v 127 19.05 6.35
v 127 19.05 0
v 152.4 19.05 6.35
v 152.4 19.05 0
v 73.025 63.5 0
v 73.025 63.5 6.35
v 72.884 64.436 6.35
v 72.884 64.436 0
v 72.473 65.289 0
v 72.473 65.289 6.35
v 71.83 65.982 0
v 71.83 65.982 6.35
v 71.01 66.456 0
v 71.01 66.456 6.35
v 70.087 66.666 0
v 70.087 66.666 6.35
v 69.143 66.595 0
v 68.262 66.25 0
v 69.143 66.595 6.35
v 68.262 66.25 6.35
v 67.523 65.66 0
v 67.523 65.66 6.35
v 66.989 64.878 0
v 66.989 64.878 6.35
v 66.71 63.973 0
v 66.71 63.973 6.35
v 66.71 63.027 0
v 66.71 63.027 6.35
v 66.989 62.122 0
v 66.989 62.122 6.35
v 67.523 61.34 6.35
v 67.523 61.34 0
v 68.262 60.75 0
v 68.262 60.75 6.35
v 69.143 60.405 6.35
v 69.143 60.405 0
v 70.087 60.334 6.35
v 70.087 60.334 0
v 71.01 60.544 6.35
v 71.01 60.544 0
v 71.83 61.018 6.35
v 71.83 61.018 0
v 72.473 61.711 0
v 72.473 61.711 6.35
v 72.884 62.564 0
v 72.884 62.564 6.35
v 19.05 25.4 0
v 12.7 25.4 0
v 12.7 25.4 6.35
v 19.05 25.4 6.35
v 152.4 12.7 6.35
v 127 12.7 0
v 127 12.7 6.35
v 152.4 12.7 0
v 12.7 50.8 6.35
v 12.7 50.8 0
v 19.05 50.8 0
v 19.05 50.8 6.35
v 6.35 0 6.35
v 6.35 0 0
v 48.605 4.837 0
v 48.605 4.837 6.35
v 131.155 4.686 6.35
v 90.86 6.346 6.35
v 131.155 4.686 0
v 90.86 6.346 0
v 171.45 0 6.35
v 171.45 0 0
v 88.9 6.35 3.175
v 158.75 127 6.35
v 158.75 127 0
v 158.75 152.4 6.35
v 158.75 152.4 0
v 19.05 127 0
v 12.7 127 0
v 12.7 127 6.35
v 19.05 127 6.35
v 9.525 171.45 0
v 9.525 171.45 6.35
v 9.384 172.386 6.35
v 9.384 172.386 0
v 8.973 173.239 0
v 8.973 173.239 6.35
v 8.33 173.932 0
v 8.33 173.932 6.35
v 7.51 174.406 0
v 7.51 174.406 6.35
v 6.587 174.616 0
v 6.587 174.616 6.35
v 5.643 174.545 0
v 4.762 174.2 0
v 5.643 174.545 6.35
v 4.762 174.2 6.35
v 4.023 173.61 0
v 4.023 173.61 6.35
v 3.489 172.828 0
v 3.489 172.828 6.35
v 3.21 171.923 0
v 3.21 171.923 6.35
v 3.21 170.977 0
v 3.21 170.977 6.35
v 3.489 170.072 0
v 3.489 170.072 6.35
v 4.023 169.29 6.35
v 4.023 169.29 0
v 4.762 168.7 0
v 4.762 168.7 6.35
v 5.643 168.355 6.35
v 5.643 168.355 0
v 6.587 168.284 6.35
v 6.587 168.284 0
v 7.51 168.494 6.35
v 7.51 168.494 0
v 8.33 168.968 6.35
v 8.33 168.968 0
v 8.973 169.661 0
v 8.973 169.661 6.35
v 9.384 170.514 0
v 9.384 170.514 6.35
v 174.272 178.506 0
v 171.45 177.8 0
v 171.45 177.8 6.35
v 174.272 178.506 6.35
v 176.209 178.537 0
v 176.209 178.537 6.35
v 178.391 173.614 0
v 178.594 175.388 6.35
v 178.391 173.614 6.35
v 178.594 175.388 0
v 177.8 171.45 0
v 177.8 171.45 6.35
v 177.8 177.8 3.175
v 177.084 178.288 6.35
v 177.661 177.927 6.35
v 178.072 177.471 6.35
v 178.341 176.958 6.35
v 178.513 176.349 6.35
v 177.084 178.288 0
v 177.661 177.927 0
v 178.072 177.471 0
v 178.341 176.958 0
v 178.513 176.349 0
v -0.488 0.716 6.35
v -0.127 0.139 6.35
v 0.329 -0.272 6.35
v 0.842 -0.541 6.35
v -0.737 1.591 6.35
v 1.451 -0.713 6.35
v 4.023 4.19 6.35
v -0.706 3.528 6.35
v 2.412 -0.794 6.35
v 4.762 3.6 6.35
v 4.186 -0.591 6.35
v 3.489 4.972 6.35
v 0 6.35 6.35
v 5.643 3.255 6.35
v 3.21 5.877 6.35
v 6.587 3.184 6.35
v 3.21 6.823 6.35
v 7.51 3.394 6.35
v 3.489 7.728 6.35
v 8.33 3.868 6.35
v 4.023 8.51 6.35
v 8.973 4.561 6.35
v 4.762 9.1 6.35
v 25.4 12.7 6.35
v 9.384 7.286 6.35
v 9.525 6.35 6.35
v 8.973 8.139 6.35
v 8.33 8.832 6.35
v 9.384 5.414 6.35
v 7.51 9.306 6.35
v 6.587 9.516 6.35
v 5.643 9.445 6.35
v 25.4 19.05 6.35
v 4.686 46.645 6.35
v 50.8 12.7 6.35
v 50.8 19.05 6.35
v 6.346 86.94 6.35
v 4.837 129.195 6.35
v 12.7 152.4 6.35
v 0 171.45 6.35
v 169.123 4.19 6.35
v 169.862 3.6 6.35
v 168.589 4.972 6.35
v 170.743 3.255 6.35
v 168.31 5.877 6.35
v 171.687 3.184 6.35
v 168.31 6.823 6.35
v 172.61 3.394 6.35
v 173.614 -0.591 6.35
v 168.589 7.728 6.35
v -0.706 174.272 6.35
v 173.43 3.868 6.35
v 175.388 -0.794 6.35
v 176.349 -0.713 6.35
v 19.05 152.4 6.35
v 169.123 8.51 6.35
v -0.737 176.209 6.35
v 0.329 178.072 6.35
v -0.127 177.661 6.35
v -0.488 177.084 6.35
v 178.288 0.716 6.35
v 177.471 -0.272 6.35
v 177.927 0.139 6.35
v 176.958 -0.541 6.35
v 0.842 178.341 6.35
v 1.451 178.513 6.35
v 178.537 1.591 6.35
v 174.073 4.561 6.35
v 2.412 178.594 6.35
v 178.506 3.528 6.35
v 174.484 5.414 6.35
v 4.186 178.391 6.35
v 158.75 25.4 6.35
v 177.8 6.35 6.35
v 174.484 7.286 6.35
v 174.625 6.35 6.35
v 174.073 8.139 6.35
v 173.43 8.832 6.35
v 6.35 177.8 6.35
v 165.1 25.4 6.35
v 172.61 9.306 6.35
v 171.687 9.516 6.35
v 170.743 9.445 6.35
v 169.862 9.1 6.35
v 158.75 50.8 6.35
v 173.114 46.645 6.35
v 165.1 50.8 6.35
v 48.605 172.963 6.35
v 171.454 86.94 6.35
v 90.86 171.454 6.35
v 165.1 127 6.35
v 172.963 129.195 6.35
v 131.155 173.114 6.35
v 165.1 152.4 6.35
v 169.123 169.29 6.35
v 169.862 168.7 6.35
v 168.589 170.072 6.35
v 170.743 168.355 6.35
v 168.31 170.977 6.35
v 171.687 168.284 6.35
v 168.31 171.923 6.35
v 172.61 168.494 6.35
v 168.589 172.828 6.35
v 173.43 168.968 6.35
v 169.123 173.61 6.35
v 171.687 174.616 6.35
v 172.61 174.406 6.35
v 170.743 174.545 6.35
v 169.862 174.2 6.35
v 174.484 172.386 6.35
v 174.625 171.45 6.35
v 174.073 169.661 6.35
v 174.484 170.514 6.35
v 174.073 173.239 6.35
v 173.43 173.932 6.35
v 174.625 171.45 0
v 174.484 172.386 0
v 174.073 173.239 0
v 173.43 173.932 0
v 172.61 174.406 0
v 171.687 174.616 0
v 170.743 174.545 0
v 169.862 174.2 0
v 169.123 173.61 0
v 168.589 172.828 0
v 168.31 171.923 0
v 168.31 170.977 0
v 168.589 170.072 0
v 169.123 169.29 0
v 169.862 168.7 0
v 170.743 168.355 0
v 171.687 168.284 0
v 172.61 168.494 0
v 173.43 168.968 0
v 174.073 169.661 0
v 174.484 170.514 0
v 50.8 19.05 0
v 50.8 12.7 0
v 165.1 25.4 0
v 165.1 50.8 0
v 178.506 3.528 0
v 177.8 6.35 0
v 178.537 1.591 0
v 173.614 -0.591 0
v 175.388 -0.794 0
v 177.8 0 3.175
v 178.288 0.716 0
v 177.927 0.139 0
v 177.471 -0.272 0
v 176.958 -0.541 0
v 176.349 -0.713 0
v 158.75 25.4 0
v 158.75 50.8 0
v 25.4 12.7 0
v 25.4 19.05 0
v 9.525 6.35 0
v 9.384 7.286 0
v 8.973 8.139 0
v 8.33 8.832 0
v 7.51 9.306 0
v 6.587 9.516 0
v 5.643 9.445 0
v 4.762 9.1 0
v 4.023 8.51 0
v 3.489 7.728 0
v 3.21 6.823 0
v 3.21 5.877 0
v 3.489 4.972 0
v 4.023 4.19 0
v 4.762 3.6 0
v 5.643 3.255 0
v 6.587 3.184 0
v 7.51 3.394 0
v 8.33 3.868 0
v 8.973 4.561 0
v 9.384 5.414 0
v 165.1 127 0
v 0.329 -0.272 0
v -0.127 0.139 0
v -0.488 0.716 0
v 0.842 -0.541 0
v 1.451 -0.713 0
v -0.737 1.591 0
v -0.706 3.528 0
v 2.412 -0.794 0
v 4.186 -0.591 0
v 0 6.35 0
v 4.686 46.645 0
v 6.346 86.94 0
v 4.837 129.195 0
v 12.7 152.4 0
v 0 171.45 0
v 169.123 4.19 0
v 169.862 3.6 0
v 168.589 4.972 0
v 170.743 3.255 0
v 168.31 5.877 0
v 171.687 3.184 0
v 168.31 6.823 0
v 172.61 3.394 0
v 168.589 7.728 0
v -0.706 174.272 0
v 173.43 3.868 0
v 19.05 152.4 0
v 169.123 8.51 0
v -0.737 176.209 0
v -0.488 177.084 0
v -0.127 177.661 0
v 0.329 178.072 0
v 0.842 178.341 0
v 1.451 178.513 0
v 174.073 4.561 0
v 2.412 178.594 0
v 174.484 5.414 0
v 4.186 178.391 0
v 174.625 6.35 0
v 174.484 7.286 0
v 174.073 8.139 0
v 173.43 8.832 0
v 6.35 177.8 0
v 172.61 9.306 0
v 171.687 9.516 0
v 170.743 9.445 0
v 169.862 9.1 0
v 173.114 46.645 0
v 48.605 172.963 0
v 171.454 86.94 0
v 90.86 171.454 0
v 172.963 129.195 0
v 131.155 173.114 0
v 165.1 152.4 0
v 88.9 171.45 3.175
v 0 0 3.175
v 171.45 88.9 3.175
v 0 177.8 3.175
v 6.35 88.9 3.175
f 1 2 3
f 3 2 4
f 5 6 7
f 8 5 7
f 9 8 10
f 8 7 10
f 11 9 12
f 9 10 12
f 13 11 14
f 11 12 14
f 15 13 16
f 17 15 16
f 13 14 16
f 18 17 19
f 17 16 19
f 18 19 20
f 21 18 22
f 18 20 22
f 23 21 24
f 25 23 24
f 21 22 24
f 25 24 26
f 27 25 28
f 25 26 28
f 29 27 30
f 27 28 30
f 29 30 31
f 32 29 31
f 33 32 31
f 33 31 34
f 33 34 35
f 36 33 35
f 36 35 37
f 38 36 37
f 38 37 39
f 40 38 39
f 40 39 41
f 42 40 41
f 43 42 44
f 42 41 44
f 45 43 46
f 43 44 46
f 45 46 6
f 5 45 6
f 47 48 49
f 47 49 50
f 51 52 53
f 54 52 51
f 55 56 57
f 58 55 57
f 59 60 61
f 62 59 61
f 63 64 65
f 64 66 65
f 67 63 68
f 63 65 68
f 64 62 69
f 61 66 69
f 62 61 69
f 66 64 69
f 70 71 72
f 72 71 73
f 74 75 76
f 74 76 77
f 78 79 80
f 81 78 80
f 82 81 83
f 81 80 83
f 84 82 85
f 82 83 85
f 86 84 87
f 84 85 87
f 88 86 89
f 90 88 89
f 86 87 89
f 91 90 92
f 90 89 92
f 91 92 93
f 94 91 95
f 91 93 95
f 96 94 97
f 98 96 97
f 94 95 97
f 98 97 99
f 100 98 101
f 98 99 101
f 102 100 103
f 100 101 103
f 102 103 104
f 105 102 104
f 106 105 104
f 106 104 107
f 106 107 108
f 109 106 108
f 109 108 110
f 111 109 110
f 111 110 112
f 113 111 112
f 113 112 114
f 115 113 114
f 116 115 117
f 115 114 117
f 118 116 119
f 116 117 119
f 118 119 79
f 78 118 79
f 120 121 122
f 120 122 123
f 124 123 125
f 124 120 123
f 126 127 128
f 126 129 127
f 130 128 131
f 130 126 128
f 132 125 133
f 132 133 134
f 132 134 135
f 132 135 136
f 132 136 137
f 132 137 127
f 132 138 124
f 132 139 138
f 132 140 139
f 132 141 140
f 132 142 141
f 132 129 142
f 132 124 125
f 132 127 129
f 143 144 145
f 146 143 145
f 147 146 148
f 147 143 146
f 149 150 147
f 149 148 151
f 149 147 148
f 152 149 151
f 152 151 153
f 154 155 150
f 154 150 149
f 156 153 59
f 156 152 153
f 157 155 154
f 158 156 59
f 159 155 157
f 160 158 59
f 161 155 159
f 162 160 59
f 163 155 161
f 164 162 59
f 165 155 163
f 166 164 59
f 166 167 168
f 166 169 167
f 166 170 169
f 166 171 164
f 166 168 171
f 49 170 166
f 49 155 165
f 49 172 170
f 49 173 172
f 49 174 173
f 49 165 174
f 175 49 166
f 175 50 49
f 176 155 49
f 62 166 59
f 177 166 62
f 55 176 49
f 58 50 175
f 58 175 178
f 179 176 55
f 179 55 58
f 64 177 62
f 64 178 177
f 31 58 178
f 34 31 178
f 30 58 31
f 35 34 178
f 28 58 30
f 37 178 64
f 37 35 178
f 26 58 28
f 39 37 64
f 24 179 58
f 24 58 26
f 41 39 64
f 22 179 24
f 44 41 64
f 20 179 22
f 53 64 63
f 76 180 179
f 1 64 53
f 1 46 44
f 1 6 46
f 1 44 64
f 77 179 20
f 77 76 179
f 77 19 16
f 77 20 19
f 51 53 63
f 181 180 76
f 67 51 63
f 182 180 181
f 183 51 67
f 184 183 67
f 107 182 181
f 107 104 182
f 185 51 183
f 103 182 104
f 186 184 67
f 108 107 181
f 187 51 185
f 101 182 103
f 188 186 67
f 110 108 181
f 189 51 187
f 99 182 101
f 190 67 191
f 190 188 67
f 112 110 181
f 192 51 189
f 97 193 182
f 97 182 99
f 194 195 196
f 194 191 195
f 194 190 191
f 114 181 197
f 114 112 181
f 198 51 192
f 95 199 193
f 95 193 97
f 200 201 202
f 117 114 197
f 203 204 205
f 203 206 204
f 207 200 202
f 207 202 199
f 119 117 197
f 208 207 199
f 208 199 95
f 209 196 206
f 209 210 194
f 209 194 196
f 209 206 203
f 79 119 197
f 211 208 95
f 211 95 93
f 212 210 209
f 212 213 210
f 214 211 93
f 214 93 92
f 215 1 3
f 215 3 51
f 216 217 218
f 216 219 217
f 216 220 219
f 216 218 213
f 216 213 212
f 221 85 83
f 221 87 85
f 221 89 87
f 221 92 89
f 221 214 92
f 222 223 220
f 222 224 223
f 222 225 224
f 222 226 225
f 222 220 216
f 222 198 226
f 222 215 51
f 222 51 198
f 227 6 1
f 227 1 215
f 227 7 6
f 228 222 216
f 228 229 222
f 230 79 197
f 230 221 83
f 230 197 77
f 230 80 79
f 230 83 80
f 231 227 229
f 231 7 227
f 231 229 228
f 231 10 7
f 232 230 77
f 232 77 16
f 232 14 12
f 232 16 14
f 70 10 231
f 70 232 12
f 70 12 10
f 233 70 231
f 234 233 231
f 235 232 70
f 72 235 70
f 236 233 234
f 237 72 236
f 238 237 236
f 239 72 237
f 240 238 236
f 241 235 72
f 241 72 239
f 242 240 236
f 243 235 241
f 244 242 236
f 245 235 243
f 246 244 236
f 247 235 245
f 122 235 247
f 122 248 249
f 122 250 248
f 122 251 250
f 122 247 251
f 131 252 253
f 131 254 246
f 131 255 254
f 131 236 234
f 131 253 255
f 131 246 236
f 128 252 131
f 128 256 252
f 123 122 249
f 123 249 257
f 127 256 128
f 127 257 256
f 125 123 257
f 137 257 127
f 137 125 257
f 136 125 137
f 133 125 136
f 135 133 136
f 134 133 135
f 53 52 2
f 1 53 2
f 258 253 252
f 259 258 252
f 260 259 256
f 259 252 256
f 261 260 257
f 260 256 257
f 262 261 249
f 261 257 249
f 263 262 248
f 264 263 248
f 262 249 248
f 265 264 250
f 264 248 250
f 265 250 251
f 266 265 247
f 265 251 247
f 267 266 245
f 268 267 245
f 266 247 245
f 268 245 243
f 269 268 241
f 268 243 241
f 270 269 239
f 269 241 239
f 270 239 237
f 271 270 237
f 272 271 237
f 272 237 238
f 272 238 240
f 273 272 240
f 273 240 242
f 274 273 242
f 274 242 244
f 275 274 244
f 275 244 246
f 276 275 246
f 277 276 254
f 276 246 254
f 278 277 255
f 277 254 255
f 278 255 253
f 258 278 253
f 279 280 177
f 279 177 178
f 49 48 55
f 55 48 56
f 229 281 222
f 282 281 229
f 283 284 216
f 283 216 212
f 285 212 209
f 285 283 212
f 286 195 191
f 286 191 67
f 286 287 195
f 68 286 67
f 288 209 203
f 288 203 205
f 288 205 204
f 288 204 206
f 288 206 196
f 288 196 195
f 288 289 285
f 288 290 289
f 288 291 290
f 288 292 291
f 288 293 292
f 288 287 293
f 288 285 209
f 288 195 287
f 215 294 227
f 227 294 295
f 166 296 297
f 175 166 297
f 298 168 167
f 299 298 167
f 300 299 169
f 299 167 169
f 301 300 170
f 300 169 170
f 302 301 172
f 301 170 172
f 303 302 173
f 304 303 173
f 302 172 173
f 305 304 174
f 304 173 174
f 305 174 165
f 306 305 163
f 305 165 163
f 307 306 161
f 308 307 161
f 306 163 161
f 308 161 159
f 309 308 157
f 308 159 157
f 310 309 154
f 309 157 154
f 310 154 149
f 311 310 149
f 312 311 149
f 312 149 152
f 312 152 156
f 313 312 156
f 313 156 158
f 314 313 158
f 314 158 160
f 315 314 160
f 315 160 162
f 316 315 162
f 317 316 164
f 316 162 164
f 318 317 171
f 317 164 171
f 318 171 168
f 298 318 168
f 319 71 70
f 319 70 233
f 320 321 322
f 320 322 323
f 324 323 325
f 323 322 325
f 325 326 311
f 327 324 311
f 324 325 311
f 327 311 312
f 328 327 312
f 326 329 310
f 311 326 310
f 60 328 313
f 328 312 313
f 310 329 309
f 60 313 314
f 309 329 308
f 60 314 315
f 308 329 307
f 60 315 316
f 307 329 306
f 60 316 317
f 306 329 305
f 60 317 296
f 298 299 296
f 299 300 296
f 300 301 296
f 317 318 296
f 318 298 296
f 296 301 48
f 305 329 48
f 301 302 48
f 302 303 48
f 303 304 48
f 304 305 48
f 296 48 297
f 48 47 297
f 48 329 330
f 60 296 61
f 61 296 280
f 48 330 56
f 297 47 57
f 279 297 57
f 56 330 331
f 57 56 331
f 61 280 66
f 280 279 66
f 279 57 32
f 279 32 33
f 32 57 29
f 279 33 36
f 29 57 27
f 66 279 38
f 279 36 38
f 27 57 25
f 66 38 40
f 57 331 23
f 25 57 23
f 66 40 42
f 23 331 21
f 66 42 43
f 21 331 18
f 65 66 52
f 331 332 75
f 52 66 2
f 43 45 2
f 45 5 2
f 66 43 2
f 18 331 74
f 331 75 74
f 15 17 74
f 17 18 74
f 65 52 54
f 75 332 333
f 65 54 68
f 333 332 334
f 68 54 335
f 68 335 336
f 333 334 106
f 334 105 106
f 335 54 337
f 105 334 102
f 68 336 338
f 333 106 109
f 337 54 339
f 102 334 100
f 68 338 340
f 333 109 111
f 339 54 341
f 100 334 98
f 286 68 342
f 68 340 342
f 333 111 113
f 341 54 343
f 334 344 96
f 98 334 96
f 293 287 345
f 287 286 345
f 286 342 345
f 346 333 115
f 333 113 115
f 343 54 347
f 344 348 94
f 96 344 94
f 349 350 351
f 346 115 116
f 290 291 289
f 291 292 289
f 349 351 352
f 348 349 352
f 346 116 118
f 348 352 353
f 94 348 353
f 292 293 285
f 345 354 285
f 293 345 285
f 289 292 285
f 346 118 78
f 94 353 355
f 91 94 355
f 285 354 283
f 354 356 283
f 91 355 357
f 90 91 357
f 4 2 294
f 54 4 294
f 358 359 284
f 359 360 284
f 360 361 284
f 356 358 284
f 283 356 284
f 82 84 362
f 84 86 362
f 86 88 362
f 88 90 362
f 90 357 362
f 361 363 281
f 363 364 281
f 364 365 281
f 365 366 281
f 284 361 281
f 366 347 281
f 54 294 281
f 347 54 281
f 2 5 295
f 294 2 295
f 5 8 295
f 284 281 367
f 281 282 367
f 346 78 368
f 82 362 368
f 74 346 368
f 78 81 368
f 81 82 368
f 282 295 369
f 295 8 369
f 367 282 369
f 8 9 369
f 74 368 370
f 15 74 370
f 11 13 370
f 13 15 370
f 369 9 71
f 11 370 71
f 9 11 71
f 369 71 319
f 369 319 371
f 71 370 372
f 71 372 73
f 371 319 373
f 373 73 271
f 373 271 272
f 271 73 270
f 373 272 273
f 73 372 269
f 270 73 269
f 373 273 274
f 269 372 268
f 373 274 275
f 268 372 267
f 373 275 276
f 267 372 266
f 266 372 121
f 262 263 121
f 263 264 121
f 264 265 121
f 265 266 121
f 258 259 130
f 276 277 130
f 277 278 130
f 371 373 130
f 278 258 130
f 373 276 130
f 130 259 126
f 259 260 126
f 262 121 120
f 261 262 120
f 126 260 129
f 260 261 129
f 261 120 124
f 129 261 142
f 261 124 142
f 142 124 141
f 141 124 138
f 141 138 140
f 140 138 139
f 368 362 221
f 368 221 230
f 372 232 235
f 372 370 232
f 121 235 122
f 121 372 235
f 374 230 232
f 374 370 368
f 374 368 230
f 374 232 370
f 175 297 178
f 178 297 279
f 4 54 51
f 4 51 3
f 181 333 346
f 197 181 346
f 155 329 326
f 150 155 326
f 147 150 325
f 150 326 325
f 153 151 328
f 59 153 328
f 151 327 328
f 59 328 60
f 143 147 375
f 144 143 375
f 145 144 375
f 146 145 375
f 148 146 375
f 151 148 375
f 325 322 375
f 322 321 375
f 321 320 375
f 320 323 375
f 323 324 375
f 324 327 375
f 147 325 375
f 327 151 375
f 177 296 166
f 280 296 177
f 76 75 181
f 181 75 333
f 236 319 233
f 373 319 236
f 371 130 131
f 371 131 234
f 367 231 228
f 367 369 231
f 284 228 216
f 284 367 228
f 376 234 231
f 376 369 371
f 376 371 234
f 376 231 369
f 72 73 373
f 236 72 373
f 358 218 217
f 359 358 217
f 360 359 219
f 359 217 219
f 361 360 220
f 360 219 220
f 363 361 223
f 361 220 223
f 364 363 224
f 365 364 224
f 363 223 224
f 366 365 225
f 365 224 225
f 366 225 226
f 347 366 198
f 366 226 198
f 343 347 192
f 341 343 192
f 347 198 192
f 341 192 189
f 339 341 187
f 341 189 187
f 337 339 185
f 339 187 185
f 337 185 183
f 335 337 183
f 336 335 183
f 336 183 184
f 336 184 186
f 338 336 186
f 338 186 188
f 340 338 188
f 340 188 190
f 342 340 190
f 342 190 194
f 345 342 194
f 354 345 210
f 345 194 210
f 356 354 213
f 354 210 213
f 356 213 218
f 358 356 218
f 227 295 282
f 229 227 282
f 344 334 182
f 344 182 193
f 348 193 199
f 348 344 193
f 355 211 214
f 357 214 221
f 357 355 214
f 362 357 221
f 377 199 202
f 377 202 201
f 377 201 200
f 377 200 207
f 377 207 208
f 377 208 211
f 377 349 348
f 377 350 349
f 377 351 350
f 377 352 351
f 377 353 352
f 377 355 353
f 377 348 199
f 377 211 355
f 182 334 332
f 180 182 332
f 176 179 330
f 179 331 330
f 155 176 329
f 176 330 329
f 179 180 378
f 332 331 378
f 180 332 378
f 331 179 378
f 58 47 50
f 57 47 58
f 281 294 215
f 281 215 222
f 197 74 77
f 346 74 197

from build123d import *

# Parameters (mm, degrees)
SKETCH1_W           = 6.35
SKETCH1_H           = 25.4
SKETCH1_W_2         = 25.4
SKETCH1_H_2         = 6.35
BOSS_EXTRUDE1_DEPTH = 6.35
SKETCH2_R           = 3.175
CUT_EXTRUDE1_DEPTH  = 6.35
SKETCH3_R           = 3.175
CUT_EXTRUDE2_DEPTH  = 6.35


with BuildPart() as part:
    # Sketch1 → Boss-Extrude1 (new body)
    with BuildSketch(Plane.XY):
        with BuildLine():
            add(Edge.make_bspline(
                [(0, 171.45), (12.7, 88.9), (0, 6.35)],
                knots=[0, 0, 0, 1, 1, 1], degree=2))
            add(Edge.make_bspline(
                [(0, 6.35), (-3.175, -3.175), (6.35, 0)],
                knots=[0, 0, 0, 1, 1, 1], degree=2))
            add(Edge.make_bspline(
                [(6.35, 0), (88.9, 12.7), (171.45, 0)],
                knots=[0, 0, 0, 1, 1, 1], degree=2))
            add(Edge.make_bspline(
                [(177.8, 6.35), (180.975, -3.175), (171.45, 0)],
                knots=[0, 0, 0, 1, 1, 1], degree=2))
            add(Edge.make_bspline(
                [(177.8, 171.45), (165.1, 88.9), (177.8, 6.35)],
                knots=[0, 0, 0, 1, 1, 1], degree=2))
            add(Edge.make_bspline(
                [(171.45, 177.8), (180.975, 180.975), (177.8, 171.45)],
                knots=[0, 0, 0, 1, 1, 1], degree=2))
            add(Edge.make_bspline(
                [(6.35, 177.8), (88.9, 165.1), (171.45, 177.8)],
                knots=[0, 0, 0, 1, 1, 1], degree=2))
            add(Edge.make_bspline(
                [(0, 171.45), (-3.175, 180.975), (6.35, 177.8)],
                knots=[0, 0, 0, 1, 1, 1], degree=2))
        make_face()
        with Locations((15.875, 38.1)):
            Rectangle(SKETCH1_W, SKETCH1_H, mode=Mode.SUBTRACT)
        with Locations((38.1, 15.875)):
            Rectangle(SKETCH1_W_2, SKETCH1_H_2, mode=Mode.SUBTRACT)
        with Locations((15.875, 139.7)):
            Rectangle(SKETCH1_W, SKETCH1_H, mode=Mode.SUBTRACT)
        with Locations((161.925, 139.7)):
            Rectangle(SKETCH1_W, SKETCH1_H, mode=Mode.SUBTRACT)
        with Locations((139.7, 15.875)):
            Rectangle(SKETCH1_W_2, SKETCH1_H_2, mode=Mode.SUBTRACT)
        with Locations((161.925, 38.1)):
            Rectangle(SKETCH1_W, SKETCH1_H, mode=Mode.SUBTRACT)
    extrude(amount=BOSS_EXTRUDE1_DEPTH)

    # Sketch2 → Cut-Extrude1 (cut)
    with BuildSketch(Plane.XY.offset(6.35)):
        with Locations((69.85, 63.5)):
            Circle(SKETCH2_R)
    extrude(amount=-CUT_EXTRUDE1_DEPTH, mode=Mode.SUBTRACT)

    # Sketch3 → Cut-Extrude2 (cut)
    with BuildSketch(Plane.XY.offset(6.35)):
        with Locations((6.35, 6.35)):
            Circle(SKETCH3_R)
        with Locations((171.45, 6.35)):
            Circle(SKETCH3_R)
        with Locations((171.45, 171.45)):
            Circle(SKETCH3_R)
        with Locations((6.35, 171.45)):
            Circle(SKETCH3_R)
    extrude(amount=-CUT_EXTRUDE2_DEPTH, mode=Mode.SUBTRACT)


solid = part.part
